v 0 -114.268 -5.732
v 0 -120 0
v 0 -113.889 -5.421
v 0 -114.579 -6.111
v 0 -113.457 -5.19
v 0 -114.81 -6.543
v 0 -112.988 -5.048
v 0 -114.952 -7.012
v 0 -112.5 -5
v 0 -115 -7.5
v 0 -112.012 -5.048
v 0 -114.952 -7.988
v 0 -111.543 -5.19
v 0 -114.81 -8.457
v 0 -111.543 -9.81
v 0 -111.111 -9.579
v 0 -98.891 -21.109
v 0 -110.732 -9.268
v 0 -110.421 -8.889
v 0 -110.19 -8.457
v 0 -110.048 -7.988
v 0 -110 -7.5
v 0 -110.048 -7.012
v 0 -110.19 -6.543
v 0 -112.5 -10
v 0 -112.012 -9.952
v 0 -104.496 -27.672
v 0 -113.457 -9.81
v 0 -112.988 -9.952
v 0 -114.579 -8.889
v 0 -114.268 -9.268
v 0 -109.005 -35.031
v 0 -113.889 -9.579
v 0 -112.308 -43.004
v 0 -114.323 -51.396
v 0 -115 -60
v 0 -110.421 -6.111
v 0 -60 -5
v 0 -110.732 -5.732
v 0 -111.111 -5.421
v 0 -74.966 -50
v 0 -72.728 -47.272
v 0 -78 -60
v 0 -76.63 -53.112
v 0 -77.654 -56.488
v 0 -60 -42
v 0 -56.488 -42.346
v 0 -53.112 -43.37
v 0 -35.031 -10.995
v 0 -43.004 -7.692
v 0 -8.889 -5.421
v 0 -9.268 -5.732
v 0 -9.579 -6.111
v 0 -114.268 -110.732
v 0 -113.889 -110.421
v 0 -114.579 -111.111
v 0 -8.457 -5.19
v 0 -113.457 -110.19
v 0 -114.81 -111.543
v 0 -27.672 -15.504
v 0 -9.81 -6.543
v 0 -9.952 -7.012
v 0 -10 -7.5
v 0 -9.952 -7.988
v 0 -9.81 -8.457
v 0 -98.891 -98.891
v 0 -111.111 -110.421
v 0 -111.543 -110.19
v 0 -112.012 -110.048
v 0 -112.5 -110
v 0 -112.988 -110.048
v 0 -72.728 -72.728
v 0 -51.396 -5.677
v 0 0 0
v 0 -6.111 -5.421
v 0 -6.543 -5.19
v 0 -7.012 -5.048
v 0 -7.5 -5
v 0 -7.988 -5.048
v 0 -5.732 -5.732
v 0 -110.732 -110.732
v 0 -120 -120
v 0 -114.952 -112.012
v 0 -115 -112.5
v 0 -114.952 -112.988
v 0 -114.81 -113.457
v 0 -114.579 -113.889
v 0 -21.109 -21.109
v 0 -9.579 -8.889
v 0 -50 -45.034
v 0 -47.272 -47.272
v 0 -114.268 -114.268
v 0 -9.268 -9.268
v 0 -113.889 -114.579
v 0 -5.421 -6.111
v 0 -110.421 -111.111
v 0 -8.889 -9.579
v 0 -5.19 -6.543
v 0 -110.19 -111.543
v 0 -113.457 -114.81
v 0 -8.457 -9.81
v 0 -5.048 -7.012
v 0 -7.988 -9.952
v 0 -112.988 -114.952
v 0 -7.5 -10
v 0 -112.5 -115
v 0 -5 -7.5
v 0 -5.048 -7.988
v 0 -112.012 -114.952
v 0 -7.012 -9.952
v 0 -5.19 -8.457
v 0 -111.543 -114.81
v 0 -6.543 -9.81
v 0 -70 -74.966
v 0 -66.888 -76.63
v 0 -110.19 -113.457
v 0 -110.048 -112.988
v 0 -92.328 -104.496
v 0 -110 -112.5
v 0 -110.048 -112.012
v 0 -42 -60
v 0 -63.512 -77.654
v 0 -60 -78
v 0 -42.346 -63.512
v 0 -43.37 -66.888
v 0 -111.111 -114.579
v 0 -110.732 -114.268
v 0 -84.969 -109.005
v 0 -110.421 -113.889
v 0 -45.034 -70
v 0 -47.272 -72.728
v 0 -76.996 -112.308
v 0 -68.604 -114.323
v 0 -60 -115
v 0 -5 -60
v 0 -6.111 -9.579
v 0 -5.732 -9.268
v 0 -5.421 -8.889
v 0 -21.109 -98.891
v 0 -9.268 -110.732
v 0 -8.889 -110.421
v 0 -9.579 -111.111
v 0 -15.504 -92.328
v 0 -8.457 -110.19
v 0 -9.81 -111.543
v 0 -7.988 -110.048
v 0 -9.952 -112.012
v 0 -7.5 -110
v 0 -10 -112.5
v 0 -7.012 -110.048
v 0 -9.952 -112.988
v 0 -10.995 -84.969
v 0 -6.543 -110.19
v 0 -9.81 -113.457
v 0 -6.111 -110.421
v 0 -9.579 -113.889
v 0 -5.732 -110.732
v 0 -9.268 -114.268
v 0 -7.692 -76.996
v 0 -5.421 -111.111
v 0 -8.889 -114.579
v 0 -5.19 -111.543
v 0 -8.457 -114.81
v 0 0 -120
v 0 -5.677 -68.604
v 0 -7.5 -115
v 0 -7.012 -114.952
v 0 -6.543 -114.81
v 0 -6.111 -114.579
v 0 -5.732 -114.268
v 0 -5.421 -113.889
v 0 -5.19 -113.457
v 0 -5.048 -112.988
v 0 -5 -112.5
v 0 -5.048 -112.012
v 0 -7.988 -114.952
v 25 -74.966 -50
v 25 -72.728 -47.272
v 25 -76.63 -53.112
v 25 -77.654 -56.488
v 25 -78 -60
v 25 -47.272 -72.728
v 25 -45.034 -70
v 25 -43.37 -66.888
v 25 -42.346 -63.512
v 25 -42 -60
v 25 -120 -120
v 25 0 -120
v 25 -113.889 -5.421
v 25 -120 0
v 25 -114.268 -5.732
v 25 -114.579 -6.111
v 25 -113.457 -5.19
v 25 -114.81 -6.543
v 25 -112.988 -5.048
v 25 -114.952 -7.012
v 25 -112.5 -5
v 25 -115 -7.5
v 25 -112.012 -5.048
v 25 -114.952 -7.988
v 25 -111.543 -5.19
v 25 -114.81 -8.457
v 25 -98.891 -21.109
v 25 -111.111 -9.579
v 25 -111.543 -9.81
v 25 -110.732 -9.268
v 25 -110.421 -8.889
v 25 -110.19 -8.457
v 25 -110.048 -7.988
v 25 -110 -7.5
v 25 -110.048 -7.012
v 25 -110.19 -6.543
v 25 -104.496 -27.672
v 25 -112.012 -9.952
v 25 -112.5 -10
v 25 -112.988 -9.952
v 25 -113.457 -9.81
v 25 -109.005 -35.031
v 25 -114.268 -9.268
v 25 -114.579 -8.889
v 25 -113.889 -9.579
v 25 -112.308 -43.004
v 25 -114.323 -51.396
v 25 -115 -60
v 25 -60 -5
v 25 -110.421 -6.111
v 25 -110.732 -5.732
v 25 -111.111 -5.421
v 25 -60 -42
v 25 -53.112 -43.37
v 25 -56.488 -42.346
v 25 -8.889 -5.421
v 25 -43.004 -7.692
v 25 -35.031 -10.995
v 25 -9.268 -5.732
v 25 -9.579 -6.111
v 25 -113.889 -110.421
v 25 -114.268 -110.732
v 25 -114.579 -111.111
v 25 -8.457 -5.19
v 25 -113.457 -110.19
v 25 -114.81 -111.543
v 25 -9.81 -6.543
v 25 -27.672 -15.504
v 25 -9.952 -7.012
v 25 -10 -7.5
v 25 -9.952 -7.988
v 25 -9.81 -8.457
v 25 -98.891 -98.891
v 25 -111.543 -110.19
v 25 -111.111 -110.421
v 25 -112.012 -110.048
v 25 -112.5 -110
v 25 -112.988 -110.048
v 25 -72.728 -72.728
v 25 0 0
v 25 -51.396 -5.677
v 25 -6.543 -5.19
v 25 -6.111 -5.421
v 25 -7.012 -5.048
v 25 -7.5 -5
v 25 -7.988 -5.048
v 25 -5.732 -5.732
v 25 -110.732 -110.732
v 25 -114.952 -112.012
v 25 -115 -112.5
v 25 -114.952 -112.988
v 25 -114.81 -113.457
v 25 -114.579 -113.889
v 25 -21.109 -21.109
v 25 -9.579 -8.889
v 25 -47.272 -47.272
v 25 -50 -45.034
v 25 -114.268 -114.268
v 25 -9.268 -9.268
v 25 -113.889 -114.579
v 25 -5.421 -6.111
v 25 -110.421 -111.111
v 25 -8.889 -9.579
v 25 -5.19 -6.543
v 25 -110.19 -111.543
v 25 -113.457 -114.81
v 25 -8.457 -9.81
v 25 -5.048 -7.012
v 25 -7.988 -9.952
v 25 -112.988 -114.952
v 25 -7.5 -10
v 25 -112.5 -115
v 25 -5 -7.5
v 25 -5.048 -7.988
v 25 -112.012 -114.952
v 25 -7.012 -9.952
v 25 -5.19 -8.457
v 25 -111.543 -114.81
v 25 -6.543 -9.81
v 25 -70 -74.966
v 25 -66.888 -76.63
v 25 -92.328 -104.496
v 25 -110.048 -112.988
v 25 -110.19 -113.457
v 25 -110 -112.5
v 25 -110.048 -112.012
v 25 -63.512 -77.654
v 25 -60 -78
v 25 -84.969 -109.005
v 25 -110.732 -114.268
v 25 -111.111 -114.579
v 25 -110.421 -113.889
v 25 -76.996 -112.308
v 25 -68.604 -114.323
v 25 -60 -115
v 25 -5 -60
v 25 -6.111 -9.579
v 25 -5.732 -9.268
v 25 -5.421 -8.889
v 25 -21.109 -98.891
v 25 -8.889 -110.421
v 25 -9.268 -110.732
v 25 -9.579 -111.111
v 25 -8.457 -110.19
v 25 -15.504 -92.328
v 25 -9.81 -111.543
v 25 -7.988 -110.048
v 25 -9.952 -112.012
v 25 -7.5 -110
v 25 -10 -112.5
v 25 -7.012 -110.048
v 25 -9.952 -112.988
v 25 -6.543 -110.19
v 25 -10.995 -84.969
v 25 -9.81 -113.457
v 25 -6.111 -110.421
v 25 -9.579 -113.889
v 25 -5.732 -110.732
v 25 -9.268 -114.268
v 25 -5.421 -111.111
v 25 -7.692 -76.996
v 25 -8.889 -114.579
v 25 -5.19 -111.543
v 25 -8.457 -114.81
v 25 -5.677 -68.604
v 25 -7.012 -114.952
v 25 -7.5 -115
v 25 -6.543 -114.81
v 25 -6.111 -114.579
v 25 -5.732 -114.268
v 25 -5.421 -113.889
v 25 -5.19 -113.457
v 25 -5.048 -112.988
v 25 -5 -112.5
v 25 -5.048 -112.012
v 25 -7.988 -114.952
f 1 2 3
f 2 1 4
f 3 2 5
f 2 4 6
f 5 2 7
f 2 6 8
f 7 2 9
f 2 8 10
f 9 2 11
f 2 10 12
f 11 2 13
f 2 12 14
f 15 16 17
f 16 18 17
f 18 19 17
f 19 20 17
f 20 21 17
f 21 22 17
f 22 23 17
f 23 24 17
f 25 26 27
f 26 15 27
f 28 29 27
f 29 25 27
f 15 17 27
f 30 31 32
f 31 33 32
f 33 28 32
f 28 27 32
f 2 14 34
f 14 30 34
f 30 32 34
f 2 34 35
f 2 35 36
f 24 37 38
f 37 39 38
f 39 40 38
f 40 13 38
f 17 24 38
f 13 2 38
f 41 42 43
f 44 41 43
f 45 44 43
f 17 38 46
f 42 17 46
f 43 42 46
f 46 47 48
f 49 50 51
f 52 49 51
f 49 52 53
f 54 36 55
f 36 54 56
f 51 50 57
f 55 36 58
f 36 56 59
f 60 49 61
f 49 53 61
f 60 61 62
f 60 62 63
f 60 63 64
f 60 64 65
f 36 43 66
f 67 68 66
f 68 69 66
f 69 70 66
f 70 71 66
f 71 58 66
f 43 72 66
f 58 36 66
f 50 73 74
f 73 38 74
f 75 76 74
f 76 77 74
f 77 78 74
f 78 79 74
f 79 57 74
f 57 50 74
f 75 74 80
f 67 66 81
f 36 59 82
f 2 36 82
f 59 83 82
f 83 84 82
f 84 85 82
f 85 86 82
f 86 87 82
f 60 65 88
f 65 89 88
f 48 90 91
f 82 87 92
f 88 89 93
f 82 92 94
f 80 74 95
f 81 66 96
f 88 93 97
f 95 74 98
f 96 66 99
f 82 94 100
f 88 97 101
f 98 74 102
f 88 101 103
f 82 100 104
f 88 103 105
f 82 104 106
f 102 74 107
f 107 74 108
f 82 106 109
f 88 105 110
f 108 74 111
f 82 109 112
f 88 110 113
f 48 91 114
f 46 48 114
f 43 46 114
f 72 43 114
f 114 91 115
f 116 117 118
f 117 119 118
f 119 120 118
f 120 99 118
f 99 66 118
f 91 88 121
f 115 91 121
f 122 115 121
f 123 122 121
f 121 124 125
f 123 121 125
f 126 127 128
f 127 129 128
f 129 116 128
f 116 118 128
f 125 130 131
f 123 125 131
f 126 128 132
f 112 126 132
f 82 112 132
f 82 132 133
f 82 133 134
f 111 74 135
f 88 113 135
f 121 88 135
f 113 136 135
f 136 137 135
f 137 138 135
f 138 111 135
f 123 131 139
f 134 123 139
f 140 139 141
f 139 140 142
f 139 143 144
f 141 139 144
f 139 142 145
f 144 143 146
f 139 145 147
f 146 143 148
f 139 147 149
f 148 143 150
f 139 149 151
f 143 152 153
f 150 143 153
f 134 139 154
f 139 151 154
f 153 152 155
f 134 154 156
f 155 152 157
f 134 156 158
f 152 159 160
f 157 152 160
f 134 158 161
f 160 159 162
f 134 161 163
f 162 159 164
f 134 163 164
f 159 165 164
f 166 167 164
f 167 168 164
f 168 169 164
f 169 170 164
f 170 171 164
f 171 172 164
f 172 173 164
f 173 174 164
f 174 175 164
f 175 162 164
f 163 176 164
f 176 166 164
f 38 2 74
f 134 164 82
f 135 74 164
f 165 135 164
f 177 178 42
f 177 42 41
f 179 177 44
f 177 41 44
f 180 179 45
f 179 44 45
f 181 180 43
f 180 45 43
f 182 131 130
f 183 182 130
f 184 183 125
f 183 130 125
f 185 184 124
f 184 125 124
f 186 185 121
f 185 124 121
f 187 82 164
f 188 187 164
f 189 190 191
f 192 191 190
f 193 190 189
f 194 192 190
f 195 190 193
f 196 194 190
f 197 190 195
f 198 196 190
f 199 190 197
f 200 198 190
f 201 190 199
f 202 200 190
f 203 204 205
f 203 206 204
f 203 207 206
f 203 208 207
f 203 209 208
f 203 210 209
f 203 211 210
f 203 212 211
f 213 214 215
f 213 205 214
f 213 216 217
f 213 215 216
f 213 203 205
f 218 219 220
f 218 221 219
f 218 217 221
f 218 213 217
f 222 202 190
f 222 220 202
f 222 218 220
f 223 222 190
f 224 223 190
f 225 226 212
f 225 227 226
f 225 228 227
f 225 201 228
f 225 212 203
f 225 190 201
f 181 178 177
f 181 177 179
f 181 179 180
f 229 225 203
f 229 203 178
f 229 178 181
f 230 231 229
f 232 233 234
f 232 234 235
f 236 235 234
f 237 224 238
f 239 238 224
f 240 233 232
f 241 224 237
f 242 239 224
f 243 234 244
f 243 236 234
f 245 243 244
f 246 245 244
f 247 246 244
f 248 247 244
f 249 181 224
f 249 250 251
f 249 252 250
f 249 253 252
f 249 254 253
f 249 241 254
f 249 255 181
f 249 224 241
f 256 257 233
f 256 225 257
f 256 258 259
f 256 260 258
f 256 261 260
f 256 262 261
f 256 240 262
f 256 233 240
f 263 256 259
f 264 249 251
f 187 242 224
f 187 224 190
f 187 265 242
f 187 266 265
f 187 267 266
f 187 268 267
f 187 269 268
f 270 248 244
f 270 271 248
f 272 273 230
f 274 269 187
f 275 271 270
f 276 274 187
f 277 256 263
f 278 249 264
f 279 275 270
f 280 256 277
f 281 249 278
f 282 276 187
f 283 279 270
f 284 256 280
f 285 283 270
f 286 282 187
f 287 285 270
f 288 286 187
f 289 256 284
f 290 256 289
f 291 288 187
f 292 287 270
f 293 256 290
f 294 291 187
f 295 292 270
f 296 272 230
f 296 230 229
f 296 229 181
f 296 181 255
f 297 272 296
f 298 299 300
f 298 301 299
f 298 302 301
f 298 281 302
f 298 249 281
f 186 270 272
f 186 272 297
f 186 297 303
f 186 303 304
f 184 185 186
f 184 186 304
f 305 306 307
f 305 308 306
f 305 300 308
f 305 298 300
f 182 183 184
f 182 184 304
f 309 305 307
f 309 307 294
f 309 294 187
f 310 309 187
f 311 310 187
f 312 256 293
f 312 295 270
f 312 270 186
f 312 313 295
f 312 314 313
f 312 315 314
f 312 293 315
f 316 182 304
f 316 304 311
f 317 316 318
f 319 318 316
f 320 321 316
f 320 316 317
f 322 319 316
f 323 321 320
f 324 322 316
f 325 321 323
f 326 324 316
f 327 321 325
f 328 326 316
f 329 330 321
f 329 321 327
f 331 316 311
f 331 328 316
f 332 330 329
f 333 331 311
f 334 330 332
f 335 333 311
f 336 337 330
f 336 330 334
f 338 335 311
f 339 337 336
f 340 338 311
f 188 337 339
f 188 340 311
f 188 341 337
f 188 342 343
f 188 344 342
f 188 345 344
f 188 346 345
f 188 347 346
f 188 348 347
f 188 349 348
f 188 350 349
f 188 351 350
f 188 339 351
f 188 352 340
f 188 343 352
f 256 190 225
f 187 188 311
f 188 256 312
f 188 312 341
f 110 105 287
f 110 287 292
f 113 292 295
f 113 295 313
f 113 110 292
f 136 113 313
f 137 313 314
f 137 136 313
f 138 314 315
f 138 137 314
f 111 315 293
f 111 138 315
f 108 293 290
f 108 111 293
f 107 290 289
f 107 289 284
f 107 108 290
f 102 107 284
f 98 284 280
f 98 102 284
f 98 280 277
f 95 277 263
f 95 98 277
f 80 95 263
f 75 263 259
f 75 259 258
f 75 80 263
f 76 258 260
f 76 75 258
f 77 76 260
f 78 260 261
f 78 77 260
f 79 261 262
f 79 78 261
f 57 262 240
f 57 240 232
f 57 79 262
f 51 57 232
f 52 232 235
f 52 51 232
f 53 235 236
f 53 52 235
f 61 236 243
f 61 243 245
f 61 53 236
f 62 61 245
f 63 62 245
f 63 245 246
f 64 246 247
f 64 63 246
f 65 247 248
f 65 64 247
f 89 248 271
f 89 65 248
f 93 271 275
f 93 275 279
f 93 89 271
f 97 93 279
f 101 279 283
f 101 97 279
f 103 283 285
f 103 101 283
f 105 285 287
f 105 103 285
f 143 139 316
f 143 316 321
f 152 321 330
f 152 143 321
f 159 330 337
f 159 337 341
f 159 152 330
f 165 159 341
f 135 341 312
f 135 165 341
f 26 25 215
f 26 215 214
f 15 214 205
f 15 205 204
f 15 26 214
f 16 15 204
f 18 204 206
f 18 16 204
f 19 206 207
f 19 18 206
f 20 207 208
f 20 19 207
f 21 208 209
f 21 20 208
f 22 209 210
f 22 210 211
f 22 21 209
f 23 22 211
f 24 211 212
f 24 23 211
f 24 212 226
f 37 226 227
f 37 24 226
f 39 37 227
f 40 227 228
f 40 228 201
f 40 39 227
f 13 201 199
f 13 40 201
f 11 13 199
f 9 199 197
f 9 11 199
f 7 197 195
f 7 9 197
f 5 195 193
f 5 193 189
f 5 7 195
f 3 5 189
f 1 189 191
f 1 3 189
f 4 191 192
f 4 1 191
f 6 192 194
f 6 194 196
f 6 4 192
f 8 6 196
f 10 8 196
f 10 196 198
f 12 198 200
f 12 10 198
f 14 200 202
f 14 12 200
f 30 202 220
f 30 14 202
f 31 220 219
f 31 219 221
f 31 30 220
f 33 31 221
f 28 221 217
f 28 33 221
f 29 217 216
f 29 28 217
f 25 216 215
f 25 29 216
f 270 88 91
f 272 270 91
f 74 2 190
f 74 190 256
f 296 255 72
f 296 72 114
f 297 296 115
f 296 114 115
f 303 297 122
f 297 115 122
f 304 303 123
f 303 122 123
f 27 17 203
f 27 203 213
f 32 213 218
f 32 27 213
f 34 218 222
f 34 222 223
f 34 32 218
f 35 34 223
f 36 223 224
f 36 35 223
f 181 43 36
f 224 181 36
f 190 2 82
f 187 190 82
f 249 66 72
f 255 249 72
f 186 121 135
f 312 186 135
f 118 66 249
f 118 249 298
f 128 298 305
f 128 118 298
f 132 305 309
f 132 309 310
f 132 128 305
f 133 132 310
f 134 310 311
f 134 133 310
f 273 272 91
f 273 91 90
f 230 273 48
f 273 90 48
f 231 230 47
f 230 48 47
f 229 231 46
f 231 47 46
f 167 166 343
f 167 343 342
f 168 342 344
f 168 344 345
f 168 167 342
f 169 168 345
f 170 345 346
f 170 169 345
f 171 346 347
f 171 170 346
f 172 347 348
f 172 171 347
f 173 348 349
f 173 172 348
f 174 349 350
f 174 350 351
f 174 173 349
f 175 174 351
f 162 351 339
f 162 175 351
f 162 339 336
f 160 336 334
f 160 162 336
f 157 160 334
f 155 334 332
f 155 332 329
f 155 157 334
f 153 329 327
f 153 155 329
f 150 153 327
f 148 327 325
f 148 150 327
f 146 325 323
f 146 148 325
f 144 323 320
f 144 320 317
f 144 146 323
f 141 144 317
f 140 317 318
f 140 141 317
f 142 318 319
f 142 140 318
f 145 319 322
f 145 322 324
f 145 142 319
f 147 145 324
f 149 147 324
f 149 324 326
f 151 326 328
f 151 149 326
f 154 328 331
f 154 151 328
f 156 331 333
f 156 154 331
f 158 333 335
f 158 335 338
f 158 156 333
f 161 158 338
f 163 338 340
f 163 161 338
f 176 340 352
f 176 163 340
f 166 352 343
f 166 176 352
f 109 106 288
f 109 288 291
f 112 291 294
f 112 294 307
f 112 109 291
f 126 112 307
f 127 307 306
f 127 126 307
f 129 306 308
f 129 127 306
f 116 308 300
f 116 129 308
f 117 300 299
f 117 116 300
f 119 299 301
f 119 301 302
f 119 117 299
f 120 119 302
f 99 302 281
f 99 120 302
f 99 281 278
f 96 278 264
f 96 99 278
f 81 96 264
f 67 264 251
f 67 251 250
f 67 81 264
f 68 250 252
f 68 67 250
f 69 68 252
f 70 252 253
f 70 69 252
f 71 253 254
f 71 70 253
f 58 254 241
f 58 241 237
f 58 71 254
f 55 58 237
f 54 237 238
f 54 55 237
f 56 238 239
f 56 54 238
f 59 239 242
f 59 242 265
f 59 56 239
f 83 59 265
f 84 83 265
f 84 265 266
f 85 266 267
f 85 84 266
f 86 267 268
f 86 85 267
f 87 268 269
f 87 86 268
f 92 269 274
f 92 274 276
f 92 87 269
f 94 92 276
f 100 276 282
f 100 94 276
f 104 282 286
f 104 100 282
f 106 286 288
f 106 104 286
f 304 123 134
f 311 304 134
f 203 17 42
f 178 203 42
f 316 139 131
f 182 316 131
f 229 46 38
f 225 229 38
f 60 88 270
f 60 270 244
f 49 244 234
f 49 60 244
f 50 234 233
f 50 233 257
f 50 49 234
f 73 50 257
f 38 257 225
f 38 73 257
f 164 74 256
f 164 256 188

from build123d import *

# Parameters (mm, degrees)
SKETCH_1_W      = 120
SKETCH_1_H      = 120
SKETCH_1_R      = 2.5
SKETCH_1_R_2    = 55
SKETCH_1_R_3    = 18
EXTRUDE_1_DEPTH = 25


with BuildPart() as part:
    # 草图1 → 凸台-拉伸1 (new body)
    # profile 1 of 6: a face of its own
    with BuildSketch(Plane(origin=(0, 0, 0), x_dir=(0, 0, -1), z_dir=(1, 0, 0))):
        with Locations((60, -60)):
            Rectangle(SKETCH_1_W, SKETCH_1_H)
        with Locations((7.5, -112.5)):
            Circle(SKETCH_1_R, mode=Mode.SUBTRACT)
        with Locations((112.5, -112.5)):
            Circle(SKETCH_1_R, mode=Mode.SUBTRACT)
        with Locations((112.5, -7.5)):
            Circle(SKETCH_1_R, mode=Mode.SUBTRACT)
        with Locations((7.5, -7.5)):
            Circle(SKETCH_1_R, mode=Mode.SUBTRACT)
        with Locations((60, -60)):
            Circle(SKETCH_1_R_2, mode=Mode.SUBTRACT)
    # profile 2 of 6: a face of its own
    with BuildSketch(Plane(origin=(0, 0, 0), x_dir=(0, 0, -1), z_dir=(1, 0, 0))):
        with Locations((60, -60)):
            Circle(SKETCH_1_R_3)
    # profile 3 of 6: a face of its own
    with BuildSketch(Plane(origin=(0, 0, 0), x_dir=(0, 0, -1), z_dir=(1, 0, 0))):
        with BuildLine():
            ThreePointArc((47.272077939, -47.272077939), (53.111698217, -43.370168415), (60, -42))
            Line((60, -42), (60, -5))
            ThreePointArc((60, -5), (38.95241122, -9.186625712), (21.109127035, -21.109127035))
            Line((21.109127035, -21.109127035), (47.272077939, -47.272077939))
        make_face()
    # profile 4 of 6: a face of its own
    with BuildSketch(Plane(origin=(0, 0, 0), x_dir=(0, 0, -1), z_dir=(1, 0, 0))):
        with BuildLine():
            Line((98.890872965, -21.109127035), (72.727922061, -47.272077939))
            ThreePointArc((72.727922061, -47.272077939), (76.629831585, -53.111698217), (78, -60))
            Line((78, -60), (115, -60))
            ThreePointArc((115, -60), (110.813374288, -38.95241122), (98.890872965, -21.109127035))
        make_face()
    # profile 5 of 6: a face of its own
    with BuildSketch(Plane(origin=(0, 0, 0), x_dir=(0, 0, -1), z_dir=(1, 0, 0))):
        with BuildLine():
            Line((98.890872965, -98.890872965), (72.727922061, -72.727922061))
            ThreePointArc((72.727922061, -72.727922061), (66.888301783, -76.629831585), (60, -78))
            Line((60, -78), (60, -115))
            ThreePointArc((60, -115), (81.04758878, -110.813374288), (98.890872965, -98.890872965))
        make_face()
    # profile 6 of 6: a face of its own
    with BuildSketch(Plane(origin=(0, 0, 0), x_dir=(0, 0, -1), z_dir=(1, 0, 0))):
        with BuildLine():
            ThreePointArc((47.272077939, -72.727922061), (43.370168415, -66.888301783), (42, -60))
            Line((42, -60), (5, -60))
            ThreePointArc((5, -60), (9.186625712, -81.04758878), (21.109127035, -98.890872965))
            Line((21.109127035, -98.890872965), (47.272077939, -72.727922061))
        make_face()
    extrude(amount=EXTRUDE_1_DEPTH)


solid = part.part
